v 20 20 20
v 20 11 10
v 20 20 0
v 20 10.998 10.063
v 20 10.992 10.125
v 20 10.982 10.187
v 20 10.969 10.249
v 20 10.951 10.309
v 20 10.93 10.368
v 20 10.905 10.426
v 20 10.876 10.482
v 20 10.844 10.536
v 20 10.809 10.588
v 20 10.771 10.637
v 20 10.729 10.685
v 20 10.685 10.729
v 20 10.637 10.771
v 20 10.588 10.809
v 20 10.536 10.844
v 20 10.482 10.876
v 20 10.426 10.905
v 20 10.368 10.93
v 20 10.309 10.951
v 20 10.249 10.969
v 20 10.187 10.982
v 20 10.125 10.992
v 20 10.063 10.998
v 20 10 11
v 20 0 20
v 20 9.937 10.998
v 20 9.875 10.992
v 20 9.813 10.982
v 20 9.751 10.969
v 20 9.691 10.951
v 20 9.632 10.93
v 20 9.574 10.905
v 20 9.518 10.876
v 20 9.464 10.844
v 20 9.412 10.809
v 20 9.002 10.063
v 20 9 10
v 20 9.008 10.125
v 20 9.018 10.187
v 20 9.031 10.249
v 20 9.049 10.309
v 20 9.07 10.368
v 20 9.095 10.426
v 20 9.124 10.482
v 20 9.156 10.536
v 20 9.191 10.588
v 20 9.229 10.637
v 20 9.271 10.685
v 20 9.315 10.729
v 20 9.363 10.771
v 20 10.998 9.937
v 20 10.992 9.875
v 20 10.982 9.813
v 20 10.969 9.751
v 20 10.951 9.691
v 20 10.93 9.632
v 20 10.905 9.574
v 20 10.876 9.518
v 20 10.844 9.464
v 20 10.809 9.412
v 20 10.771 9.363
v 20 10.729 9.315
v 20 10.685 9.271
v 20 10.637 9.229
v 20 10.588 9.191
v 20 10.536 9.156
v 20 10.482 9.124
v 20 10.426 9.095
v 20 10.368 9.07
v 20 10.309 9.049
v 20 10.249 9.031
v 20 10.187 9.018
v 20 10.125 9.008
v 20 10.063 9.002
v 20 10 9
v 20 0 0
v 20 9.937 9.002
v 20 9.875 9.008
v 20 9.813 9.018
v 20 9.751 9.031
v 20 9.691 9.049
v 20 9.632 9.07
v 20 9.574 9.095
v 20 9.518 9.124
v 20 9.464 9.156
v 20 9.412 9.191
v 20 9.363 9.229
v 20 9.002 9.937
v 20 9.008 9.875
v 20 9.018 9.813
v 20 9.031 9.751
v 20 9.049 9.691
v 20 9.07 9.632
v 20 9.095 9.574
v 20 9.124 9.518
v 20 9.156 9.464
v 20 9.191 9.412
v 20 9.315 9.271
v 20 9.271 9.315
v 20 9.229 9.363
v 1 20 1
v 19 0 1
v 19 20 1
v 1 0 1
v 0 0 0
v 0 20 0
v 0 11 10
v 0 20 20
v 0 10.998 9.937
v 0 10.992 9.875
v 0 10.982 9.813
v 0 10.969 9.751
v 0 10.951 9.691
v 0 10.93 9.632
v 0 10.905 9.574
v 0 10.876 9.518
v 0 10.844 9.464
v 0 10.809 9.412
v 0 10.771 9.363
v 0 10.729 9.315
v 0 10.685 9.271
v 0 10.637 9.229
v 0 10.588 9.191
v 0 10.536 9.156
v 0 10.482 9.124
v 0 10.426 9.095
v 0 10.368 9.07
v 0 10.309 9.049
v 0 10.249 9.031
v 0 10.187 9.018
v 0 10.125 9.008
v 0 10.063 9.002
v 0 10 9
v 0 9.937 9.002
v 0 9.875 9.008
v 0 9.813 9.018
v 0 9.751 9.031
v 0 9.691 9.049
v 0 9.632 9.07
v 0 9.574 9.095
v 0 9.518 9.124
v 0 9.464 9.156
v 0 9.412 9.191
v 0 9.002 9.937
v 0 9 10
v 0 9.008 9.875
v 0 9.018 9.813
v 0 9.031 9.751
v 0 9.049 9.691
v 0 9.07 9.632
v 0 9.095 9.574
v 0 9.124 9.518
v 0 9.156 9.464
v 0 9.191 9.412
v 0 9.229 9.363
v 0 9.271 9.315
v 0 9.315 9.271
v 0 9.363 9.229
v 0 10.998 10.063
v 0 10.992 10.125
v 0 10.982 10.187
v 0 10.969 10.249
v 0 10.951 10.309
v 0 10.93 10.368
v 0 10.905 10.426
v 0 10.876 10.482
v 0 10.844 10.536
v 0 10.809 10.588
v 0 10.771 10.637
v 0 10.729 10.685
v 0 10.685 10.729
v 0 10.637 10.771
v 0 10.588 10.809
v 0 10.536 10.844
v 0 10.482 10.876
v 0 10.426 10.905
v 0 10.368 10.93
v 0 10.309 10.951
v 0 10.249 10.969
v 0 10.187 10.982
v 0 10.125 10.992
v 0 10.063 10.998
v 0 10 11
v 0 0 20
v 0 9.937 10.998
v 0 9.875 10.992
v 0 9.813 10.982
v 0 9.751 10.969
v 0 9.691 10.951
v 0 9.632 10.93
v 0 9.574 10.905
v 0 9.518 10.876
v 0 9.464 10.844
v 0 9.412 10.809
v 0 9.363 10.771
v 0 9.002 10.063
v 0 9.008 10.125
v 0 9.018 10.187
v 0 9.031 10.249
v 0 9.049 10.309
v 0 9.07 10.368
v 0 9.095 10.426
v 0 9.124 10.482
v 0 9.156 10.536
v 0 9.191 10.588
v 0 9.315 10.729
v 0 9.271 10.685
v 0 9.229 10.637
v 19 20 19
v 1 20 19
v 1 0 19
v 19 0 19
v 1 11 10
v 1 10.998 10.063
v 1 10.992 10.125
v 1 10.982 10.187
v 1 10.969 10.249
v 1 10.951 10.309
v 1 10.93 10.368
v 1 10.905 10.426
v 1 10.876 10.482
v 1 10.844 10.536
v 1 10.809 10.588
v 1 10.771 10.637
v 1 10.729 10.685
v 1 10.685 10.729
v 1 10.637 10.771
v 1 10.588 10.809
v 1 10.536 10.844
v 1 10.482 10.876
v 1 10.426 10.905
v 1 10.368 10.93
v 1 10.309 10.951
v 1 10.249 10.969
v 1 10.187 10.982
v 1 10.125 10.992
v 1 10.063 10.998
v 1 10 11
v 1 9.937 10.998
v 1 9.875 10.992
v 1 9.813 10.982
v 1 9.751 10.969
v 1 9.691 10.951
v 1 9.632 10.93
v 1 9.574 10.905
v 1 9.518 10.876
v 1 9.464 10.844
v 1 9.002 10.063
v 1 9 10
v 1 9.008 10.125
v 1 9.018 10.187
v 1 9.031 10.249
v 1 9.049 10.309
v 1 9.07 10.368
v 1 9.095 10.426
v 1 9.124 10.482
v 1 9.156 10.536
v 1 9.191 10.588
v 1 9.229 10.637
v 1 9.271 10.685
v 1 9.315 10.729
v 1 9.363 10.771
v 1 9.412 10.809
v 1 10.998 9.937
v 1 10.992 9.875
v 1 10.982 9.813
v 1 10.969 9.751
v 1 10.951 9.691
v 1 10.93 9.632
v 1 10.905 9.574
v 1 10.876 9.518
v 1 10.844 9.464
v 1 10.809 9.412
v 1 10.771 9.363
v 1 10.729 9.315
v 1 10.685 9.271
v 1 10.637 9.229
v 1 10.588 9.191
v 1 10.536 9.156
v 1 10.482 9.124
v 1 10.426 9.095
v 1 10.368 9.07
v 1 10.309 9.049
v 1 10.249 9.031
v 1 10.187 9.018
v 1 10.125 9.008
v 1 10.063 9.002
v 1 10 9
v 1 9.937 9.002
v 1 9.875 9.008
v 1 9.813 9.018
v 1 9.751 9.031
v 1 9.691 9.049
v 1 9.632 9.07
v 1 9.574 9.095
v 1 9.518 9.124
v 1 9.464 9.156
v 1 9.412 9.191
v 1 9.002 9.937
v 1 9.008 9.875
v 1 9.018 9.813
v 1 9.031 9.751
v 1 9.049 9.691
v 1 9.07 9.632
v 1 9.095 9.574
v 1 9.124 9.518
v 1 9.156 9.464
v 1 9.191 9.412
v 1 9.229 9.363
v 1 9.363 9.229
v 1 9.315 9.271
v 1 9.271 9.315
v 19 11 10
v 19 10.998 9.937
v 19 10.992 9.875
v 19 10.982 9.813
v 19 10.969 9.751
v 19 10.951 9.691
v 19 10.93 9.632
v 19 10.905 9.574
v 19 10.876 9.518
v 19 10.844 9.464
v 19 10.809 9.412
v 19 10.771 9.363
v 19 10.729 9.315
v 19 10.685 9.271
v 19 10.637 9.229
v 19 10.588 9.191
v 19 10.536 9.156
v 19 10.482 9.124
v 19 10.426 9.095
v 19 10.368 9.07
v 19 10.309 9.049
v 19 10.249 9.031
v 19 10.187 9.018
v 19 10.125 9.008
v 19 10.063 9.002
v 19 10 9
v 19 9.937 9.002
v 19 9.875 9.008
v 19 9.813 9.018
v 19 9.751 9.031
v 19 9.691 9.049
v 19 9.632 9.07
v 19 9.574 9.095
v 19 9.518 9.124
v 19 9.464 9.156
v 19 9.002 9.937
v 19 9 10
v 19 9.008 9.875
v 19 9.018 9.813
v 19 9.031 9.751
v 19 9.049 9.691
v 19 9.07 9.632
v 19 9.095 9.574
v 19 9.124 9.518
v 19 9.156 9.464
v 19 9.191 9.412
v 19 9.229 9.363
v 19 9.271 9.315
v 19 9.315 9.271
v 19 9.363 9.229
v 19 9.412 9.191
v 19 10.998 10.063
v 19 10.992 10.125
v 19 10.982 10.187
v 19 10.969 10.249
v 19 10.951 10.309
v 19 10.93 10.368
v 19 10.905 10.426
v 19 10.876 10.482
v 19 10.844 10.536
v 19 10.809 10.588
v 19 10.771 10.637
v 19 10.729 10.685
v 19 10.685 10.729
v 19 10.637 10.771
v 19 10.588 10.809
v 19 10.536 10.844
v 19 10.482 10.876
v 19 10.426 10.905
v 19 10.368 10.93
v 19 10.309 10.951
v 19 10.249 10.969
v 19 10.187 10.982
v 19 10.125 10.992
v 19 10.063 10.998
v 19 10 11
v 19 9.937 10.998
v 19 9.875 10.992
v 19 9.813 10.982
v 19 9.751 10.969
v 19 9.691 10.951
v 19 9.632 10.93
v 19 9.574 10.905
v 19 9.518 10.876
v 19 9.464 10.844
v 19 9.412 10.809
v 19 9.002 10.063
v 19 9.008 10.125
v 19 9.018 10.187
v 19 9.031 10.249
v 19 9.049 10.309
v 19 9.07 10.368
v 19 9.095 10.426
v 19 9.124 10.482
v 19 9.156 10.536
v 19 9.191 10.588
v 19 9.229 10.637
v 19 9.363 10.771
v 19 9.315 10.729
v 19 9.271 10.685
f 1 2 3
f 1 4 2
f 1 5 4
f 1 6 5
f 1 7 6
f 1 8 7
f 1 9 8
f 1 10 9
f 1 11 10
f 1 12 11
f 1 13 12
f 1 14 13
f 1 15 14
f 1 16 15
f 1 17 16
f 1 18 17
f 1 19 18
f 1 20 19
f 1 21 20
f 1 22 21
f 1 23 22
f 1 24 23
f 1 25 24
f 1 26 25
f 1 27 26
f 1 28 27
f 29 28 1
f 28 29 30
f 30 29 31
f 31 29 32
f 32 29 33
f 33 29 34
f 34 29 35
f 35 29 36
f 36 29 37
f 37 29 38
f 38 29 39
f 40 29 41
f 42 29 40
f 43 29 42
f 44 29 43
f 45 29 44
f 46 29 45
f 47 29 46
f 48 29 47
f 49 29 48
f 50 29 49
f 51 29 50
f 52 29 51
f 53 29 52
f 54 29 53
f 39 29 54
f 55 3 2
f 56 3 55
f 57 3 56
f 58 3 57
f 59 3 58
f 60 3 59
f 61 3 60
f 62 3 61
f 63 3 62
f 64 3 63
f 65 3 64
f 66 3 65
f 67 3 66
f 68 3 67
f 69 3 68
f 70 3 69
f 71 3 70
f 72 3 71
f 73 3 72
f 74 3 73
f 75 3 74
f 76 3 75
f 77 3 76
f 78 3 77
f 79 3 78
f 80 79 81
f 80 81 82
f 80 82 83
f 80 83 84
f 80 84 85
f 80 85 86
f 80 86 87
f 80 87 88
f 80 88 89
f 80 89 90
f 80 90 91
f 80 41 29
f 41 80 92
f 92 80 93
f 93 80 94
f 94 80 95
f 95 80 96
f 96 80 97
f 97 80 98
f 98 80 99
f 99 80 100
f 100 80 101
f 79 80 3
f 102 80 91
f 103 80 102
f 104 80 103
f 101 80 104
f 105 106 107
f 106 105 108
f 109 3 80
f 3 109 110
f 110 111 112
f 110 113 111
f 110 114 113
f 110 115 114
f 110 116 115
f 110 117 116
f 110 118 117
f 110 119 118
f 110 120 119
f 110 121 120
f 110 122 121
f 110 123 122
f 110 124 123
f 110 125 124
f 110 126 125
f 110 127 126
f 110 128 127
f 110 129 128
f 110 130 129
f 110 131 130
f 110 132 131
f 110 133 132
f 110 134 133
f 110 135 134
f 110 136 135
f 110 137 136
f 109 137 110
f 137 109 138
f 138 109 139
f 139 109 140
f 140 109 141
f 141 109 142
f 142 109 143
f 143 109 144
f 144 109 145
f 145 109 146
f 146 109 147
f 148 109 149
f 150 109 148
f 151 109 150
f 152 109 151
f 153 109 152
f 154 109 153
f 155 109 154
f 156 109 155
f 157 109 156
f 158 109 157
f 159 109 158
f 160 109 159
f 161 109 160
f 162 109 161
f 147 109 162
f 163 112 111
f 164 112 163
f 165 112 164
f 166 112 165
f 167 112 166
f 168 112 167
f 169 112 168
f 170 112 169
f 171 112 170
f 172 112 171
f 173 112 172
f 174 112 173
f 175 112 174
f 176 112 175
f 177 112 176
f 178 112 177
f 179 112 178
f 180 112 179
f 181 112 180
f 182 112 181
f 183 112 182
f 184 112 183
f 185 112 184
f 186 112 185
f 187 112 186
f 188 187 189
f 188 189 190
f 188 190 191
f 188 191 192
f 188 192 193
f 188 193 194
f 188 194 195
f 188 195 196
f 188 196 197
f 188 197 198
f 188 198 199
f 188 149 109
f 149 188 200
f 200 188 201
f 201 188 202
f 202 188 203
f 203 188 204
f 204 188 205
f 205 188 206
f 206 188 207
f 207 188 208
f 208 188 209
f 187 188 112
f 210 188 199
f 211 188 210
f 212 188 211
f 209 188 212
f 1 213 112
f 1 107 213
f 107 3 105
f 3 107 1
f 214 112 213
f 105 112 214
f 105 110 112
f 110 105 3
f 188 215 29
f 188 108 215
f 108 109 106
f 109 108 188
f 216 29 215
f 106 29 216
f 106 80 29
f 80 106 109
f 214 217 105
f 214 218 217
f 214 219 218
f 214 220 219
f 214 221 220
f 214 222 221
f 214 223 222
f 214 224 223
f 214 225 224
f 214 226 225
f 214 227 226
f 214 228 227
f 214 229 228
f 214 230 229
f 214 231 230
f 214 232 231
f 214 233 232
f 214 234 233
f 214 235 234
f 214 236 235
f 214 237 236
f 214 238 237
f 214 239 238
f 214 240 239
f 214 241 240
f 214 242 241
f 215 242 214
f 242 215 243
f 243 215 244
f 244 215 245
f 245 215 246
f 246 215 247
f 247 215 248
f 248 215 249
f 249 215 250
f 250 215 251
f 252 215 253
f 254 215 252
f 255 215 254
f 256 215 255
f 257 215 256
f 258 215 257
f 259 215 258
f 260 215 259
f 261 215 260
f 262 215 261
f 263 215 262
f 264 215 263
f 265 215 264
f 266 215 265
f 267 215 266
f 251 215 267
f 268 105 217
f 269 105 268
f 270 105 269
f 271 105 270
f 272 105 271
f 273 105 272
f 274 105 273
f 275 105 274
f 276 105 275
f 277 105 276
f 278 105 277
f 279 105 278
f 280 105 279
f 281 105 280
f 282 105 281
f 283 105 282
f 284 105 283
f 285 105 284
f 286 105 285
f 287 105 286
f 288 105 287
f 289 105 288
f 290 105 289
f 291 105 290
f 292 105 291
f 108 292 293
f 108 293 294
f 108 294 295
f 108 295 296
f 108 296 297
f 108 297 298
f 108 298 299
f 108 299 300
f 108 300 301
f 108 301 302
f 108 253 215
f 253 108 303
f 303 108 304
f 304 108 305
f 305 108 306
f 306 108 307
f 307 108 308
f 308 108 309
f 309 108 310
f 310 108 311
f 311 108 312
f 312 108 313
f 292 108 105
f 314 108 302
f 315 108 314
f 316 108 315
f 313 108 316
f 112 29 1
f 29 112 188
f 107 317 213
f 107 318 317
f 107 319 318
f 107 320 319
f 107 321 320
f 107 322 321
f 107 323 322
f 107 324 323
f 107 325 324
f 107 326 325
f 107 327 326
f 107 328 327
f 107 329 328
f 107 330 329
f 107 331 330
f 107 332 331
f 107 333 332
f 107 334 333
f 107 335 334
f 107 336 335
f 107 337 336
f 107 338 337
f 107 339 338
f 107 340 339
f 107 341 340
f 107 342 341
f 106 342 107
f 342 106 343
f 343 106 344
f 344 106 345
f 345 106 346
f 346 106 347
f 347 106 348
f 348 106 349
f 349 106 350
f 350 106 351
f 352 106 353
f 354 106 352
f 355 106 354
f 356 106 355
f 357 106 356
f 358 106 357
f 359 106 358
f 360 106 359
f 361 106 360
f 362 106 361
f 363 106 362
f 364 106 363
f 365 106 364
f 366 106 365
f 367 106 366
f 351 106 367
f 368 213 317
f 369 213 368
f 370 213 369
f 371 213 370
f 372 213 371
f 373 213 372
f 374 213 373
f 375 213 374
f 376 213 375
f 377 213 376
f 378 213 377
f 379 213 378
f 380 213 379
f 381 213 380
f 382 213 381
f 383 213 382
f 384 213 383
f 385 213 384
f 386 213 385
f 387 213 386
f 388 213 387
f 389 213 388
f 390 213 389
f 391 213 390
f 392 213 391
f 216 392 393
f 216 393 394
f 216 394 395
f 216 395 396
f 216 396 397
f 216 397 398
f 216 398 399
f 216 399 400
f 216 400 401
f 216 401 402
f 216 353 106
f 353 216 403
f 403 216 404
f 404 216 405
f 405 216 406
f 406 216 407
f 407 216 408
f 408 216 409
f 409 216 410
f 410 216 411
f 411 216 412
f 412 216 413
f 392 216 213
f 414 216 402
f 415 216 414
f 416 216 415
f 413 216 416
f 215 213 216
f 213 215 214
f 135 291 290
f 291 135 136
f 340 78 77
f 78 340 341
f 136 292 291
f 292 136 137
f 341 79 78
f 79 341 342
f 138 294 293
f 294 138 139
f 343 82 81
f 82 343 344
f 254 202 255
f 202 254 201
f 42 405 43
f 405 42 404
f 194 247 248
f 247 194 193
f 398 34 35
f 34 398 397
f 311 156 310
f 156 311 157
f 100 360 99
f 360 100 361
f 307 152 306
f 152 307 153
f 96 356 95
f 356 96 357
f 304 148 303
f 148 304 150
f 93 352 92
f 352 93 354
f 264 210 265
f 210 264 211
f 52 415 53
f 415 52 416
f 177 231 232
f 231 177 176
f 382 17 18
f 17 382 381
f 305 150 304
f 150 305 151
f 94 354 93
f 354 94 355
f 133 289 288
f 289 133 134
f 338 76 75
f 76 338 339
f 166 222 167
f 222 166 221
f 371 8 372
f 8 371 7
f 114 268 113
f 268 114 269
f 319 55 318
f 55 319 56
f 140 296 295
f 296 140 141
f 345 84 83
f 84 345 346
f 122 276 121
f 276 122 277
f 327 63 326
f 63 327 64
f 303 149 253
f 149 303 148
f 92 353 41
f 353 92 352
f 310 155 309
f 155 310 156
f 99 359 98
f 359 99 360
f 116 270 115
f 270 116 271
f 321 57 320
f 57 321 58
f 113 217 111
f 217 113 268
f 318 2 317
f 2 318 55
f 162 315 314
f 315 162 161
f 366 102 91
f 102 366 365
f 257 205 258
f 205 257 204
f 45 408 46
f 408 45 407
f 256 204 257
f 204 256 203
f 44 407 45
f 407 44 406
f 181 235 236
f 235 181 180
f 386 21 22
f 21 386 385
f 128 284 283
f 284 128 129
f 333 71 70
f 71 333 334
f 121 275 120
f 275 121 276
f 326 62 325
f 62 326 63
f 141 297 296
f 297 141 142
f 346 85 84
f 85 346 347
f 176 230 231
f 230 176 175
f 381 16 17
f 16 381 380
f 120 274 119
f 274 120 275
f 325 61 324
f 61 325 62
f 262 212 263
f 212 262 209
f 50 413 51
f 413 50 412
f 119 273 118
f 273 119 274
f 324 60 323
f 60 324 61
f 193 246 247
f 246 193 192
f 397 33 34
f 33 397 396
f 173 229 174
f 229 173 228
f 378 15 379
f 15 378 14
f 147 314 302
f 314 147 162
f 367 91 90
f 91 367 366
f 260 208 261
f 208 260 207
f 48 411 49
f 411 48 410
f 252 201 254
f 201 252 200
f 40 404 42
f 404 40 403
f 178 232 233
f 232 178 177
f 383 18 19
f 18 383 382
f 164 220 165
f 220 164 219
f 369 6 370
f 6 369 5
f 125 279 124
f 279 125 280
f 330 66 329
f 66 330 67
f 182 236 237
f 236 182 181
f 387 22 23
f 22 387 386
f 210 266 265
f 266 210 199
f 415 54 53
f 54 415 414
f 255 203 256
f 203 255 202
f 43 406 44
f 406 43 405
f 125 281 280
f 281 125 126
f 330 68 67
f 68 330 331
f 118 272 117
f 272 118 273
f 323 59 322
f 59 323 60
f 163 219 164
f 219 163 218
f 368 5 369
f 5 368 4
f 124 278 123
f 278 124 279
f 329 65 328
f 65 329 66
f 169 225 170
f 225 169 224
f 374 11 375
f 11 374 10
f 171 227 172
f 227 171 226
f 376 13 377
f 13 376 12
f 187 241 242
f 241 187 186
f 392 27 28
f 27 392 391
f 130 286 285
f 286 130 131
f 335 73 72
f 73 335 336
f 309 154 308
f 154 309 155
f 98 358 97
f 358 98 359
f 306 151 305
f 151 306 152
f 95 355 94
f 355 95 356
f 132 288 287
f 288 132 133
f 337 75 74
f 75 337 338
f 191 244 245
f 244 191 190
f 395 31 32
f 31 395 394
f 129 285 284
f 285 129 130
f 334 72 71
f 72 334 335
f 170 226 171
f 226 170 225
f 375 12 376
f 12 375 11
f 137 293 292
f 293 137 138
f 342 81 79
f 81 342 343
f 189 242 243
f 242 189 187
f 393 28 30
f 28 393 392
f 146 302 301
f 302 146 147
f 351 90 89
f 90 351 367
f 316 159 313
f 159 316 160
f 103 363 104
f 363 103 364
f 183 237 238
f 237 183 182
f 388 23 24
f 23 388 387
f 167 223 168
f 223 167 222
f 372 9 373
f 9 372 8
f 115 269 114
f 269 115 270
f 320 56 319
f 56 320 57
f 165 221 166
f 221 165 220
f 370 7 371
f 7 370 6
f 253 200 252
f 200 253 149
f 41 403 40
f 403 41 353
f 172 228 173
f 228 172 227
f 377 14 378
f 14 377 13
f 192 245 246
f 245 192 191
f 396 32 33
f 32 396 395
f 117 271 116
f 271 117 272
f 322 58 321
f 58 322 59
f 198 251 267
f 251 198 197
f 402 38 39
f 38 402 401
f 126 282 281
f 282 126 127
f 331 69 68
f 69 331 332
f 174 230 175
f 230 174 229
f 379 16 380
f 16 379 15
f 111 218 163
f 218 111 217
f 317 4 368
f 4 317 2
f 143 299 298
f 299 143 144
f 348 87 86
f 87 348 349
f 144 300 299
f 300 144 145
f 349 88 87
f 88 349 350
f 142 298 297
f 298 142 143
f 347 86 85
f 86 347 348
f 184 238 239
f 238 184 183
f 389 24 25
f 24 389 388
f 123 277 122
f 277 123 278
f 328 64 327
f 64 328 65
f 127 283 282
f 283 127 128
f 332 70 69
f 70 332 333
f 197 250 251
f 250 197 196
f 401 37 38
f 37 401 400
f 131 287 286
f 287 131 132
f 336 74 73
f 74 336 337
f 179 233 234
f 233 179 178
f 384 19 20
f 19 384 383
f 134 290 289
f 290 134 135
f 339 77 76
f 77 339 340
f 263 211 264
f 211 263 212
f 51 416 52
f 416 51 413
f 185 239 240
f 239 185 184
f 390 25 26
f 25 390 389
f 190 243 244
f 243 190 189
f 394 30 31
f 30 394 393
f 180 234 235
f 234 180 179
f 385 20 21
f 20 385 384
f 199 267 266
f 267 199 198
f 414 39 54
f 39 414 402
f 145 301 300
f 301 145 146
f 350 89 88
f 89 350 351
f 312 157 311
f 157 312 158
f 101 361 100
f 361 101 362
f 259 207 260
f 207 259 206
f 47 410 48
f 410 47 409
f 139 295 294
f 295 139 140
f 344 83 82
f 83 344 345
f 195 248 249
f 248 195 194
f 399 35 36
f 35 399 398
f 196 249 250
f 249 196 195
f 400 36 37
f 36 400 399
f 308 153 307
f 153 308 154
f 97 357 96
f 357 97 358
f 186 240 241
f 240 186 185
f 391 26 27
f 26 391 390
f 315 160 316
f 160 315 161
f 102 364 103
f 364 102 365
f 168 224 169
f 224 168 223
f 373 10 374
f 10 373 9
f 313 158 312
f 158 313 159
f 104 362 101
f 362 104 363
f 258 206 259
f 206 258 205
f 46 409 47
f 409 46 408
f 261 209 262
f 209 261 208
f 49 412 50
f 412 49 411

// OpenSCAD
// file: drive-cylinder-crank-shaft.scad
$fn=100;

module crank_shaft(_r, _h) {

	union() {
		cylinder(r=_r, h=_h);
		hull() {
			translate([0, 0, _h]) cylinder(r=1.5*_r, 1);
			translate([3*_r, 0, _h]) cylinder(r=_r, 1);
		}
		translate([3*_r, 0, _h]) cylinder(r=0.5*_r, 5);

	}

}

crank_shaft(1, 20);
// main file
use <drive-cylinder-crank-shaft.scad>

module housing(_dim) {

	difference() {
		union() {
			// base
			cube([_dim[0], _dim[1], 1]);

			// left wall
			cube([1, _dim[1], _dim[2]]);

			// right wall
			translate([_dim[0]-1, 0, 0]) cube([1, _dim[1], _dim[2]]);

			// top
			translate([0, 0, _dim[2]-1]) cube([_dim[0], _dim[1], 1]);
		}
	
		// make holes for (gear) shaft
		translate([_dim[0]/-2, _dim[1]/2, _dim[2]/2])
			rotate([0, 90, 0])
				crank_shaft(1, 2*_dim[0]);
	}

}

housing([20, 20, 20]);
